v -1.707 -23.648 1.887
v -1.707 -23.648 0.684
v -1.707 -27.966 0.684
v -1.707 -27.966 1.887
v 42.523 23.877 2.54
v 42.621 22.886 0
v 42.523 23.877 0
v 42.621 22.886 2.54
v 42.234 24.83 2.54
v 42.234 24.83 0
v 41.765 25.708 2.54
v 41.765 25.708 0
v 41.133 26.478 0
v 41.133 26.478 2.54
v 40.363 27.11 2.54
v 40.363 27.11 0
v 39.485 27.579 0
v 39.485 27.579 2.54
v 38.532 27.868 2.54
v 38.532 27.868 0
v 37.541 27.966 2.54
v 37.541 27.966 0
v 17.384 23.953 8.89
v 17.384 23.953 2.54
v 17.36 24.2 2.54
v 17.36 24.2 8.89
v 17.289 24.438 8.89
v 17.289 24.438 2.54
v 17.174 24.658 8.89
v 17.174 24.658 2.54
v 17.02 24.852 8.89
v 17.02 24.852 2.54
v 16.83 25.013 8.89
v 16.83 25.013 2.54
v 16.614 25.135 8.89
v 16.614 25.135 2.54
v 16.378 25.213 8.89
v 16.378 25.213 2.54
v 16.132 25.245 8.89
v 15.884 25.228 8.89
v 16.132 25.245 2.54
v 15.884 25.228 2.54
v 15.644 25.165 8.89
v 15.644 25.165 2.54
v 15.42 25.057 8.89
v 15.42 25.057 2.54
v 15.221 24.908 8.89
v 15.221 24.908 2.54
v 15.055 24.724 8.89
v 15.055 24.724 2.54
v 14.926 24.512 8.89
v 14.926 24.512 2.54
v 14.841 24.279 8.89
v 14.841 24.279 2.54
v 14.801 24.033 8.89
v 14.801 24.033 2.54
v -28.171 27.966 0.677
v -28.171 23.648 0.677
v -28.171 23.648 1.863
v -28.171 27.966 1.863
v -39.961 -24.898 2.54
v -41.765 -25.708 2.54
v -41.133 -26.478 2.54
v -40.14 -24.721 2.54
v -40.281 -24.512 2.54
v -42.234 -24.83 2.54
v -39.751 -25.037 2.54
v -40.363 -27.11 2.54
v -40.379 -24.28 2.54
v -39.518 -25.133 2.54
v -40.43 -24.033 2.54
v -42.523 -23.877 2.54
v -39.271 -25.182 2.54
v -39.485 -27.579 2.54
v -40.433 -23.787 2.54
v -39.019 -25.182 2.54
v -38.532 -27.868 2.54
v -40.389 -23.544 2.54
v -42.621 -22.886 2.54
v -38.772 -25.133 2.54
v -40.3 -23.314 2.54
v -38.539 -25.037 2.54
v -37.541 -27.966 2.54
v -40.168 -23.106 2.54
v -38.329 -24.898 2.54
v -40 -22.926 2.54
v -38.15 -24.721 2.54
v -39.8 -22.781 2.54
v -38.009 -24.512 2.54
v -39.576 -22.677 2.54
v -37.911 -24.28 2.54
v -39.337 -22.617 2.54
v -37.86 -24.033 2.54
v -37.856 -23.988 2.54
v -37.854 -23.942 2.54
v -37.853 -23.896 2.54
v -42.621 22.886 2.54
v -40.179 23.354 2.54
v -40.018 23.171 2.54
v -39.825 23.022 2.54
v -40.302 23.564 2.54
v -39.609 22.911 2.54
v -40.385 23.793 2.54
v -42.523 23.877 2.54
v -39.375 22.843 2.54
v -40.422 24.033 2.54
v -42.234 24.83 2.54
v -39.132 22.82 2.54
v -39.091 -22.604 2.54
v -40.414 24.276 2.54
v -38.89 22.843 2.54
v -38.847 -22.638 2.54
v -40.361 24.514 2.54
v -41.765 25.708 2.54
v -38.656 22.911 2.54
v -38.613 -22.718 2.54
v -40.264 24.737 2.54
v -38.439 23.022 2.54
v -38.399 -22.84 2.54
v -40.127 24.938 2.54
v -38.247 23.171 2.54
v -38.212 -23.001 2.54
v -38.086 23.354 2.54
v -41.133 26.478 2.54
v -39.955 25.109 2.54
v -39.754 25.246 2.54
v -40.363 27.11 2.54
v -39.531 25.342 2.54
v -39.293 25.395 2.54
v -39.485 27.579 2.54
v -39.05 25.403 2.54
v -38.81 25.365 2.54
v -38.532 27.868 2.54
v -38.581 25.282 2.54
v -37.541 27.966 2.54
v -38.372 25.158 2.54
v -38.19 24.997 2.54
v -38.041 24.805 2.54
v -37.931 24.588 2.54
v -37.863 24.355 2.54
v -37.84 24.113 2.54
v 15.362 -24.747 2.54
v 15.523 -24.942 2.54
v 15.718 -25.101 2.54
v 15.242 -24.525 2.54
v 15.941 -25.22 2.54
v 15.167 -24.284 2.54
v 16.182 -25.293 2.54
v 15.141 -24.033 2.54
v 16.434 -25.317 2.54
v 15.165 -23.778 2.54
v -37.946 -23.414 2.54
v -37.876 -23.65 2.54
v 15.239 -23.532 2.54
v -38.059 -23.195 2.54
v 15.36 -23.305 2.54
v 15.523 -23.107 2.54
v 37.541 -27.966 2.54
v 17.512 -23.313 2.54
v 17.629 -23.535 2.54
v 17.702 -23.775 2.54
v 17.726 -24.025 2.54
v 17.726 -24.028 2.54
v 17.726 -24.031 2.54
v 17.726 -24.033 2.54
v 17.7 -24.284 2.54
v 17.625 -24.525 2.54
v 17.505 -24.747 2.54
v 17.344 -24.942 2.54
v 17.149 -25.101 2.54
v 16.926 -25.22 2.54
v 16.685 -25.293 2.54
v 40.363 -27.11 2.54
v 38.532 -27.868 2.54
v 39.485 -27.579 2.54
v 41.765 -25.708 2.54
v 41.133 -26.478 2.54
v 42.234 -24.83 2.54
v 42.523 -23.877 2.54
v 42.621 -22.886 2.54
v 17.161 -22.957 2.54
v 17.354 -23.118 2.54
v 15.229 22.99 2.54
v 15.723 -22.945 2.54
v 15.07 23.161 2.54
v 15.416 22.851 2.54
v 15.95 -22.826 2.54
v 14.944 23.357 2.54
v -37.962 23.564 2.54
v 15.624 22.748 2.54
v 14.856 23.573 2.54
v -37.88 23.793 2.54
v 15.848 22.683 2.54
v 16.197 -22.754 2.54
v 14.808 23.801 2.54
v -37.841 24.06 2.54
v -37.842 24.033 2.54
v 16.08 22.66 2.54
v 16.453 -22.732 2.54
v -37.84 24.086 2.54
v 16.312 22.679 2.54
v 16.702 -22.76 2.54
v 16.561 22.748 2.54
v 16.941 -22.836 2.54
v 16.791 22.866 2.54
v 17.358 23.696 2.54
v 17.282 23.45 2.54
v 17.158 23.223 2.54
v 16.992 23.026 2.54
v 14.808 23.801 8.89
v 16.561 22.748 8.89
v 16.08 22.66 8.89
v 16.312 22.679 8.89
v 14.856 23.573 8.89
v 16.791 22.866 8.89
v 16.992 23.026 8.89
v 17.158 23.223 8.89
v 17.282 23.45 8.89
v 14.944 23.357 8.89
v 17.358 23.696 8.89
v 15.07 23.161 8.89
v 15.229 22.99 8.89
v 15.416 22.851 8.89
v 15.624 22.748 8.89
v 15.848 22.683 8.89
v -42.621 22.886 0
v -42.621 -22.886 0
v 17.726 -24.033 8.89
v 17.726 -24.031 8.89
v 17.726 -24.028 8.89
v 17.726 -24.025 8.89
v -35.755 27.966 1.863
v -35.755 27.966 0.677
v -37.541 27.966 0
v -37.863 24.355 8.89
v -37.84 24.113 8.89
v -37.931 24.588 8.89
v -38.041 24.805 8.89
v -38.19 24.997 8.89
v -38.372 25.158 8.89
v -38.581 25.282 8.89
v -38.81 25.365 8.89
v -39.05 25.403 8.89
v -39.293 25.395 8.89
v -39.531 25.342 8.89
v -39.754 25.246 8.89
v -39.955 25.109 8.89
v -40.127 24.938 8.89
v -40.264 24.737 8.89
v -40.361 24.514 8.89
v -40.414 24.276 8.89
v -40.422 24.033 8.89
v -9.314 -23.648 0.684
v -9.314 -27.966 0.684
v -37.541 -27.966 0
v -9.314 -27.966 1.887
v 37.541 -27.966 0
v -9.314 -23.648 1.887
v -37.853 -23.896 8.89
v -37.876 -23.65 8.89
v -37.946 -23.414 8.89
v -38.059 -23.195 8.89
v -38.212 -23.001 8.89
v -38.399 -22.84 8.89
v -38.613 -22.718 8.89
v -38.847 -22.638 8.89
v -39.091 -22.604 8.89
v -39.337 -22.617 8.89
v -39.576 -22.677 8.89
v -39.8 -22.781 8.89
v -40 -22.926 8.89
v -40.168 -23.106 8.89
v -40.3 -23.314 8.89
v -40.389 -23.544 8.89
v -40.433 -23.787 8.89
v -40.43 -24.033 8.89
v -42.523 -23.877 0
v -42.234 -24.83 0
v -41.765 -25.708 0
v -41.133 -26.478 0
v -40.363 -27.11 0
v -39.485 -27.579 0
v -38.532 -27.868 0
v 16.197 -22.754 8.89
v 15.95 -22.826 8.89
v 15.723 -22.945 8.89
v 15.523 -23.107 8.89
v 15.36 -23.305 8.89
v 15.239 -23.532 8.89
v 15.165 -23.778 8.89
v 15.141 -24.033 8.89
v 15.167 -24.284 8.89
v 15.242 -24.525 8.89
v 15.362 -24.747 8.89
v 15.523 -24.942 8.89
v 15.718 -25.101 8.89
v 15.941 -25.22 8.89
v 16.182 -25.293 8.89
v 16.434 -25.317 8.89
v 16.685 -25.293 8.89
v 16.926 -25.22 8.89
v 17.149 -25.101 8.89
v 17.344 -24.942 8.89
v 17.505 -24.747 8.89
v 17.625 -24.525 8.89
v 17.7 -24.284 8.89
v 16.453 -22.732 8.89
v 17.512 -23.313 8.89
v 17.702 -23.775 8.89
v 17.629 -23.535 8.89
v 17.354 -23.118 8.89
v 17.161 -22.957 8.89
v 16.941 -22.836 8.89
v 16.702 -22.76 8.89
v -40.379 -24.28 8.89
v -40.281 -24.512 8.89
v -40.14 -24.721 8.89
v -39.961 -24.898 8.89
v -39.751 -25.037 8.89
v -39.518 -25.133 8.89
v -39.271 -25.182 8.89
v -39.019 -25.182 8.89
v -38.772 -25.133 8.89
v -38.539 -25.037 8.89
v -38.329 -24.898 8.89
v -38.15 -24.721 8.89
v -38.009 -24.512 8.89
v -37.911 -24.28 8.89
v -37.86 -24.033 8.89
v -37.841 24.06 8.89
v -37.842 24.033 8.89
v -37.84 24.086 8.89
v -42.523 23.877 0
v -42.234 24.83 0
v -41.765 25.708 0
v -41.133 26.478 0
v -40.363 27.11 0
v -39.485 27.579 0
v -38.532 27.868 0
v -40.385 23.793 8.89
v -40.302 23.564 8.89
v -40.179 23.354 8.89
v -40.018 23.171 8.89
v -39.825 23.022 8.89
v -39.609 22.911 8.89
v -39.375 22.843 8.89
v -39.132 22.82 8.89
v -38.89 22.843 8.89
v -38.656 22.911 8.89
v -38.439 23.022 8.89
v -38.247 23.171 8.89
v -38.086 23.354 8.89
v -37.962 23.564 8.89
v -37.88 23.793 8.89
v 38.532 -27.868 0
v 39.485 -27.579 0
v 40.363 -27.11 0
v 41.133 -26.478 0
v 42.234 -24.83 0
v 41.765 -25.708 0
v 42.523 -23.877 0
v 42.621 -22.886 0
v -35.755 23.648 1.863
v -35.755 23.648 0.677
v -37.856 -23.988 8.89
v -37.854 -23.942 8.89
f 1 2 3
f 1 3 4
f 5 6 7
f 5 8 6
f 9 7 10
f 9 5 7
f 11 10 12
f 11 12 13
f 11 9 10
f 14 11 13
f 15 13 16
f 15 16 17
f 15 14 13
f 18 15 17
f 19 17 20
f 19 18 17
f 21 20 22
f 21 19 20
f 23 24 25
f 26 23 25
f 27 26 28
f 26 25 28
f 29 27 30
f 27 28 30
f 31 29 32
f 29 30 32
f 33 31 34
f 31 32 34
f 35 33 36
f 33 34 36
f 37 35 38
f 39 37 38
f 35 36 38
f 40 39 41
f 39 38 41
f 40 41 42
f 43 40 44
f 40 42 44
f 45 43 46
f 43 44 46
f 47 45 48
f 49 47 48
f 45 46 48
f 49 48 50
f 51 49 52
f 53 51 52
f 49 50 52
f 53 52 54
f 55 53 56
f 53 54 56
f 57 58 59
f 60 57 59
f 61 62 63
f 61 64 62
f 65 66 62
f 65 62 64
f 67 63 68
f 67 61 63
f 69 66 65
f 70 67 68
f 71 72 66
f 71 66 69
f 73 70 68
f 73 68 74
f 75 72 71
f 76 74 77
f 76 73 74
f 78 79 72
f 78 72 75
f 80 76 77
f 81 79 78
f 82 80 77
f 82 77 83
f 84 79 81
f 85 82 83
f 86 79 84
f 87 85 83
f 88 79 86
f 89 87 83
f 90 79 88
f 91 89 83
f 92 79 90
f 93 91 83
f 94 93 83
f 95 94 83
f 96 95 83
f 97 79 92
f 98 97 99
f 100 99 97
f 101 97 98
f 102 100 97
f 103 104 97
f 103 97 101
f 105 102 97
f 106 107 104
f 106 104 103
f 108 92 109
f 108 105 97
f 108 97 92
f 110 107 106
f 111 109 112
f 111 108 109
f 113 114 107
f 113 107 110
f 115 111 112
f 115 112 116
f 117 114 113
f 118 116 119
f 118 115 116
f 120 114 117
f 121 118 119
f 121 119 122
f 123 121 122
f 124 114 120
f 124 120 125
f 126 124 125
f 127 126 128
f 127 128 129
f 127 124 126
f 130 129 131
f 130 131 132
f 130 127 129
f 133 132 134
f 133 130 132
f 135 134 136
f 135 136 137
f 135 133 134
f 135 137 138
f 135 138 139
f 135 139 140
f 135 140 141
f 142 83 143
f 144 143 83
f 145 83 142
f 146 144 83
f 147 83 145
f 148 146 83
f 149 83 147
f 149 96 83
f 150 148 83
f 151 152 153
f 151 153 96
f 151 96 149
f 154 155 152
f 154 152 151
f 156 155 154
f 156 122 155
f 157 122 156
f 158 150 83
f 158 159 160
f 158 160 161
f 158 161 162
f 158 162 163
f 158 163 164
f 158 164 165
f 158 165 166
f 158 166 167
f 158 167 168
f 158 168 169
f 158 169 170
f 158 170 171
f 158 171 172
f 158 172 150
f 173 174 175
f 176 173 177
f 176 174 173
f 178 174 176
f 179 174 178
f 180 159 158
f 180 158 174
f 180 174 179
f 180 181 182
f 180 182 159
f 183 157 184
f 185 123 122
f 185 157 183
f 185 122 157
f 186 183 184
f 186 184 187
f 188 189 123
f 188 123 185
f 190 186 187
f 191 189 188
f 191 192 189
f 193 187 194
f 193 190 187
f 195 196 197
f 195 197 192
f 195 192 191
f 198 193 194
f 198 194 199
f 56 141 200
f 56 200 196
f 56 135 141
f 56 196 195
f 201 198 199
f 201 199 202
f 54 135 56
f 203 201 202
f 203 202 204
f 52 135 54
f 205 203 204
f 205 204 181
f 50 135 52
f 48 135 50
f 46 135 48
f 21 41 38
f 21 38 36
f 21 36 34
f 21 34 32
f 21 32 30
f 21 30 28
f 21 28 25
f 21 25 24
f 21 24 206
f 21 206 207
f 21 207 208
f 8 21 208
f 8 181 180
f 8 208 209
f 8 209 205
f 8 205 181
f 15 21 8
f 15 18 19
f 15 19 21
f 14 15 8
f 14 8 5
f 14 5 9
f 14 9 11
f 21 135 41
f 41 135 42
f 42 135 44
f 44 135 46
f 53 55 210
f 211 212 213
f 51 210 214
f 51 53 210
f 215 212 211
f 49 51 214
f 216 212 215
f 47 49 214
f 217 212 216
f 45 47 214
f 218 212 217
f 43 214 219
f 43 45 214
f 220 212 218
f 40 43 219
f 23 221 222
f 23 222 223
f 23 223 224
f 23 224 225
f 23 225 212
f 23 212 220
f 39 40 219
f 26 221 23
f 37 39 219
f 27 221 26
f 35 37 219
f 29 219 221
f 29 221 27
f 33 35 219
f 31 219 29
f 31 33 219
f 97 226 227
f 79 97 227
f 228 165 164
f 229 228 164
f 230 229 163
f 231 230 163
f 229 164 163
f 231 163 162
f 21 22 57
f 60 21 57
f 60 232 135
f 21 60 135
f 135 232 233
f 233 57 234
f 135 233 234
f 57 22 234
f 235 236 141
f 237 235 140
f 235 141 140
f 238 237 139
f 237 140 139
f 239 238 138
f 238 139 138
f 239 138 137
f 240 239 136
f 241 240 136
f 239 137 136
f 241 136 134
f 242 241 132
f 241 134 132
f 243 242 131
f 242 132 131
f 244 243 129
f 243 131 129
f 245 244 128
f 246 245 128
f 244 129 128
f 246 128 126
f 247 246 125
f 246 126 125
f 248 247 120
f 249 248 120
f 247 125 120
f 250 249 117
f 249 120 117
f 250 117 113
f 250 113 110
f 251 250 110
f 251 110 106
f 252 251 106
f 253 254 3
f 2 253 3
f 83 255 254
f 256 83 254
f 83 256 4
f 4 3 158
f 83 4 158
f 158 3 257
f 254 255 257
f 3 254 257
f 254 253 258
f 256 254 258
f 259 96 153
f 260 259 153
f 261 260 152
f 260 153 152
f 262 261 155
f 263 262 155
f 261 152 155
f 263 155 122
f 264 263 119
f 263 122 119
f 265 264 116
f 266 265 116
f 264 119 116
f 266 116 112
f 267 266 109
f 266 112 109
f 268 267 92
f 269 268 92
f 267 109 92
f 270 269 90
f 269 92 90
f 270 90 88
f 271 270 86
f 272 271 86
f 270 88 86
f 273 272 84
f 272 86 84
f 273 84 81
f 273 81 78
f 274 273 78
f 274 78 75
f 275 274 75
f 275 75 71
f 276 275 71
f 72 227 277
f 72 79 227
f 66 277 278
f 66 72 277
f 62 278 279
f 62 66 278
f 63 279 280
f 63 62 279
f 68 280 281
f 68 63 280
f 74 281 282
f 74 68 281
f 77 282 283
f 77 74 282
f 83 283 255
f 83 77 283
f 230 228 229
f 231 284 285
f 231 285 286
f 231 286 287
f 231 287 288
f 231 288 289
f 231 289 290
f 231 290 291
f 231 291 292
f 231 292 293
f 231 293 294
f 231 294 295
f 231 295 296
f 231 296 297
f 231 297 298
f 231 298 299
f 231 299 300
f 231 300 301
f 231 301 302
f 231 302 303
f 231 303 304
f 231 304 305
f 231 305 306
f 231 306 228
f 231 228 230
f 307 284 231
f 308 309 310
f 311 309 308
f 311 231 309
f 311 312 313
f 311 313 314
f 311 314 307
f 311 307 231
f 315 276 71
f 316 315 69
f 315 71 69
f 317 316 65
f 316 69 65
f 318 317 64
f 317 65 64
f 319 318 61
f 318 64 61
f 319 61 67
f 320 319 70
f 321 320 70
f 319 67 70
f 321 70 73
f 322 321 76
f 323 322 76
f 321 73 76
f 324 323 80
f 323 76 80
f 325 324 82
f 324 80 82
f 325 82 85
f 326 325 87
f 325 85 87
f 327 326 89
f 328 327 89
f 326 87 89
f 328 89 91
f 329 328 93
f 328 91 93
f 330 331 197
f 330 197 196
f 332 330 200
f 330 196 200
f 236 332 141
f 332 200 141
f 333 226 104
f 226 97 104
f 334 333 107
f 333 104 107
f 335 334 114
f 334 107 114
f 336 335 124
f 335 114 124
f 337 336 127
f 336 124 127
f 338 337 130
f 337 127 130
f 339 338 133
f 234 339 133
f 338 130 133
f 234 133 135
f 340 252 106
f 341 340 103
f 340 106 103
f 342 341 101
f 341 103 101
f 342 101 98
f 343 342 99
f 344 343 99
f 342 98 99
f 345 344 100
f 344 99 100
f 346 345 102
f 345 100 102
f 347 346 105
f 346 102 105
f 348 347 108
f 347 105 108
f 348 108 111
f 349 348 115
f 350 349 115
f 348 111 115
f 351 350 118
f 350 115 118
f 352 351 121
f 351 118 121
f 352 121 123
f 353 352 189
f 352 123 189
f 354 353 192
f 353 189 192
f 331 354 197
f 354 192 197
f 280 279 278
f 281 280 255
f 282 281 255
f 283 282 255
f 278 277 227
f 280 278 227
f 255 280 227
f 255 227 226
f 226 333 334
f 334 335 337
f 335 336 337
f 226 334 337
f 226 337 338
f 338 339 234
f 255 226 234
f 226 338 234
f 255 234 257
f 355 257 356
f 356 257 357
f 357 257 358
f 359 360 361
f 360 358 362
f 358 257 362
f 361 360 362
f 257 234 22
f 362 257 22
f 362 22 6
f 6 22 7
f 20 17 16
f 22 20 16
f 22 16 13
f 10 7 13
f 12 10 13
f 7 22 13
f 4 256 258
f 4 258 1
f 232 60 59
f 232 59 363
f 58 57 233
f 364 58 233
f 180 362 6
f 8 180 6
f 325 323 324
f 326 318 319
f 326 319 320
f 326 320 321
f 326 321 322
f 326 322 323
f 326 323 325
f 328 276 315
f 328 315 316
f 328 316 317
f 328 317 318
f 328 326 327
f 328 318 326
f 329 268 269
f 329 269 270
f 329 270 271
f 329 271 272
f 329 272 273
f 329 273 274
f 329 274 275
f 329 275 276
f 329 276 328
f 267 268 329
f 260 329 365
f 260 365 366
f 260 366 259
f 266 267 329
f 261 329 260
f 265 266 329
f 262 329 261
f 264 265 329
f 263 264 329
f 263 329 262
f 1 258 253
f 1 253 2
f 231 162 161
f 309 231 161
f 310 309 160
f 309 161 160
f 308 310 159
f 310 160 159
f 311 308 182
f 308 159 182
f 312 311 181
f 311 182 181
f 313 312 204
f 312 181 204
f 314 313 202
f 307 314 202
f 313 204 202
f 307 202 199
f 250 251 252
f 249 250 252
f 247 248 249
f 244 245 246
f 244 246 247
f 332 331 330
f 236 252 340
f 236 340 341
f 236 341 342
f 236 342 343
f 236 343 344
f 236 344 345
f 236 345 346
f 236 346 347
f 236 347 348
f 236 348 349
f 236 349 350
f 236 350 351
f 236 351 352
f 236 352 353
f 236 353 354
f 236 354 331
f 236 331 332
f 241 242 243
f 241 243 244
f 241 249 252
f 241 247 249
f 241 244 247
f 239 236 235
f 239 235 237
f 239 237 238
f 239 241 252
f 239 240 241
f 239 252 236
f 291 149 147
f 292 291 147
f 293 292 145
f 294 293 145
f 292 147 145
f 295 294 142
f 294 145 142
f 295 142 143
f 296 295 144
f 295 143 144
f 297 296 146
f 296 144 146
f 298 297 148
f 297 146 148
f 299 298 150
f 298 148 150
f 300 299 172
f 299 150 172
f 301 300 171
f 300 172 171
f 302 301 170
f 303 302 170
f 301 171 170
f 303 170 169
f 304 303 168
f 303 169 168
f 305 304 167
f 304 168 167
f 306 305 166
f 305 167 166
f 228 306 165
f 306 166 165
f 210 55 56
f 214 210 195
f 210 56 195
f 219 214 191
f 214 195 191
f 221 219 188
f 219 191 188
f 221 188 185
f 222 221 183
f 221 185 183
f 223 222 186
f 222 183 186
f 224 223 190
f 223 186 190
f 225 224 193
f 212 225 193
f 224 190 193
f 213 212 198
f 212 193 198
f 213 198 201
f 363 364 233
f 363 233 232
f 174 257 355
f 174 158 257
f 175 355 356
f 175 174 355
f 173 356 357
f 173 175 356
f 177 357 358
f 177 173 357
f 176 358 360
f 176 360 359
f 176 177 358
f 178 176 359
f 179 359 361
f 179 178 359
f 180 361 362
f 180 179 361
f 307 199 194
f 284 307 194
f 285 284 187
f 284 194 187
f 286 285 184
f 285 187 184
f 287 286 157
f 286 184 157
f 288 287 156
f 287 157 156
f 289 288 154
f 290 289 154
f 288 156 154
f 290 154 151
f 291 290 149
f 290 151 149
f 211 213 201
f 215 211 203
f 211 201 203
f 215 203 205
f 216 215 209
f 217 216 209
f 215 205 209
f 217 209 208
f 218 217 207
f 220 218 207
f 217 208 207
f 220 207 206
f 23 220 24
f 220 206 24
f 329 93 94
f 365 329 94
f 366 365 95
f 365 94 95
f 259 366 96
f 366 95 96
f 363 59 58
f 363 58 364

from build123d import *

# Parameters (mm, degrees)
F1_DEPTH = 2.54
F2_R     = 5.08
F3_DEPTH = 8.89
F5_W     = 7.6071470976
F5_H     = 1.2031628285
F6_DEPTH = 4.318
F7_W     = 7.584489882
F7_H     = 1.1869876339
F8_DEPTH = 4.318


# Not quite as in the source:
# - ends of sketch curves that miss each other by under 0.0002 mm in the source are joined


with BuildPart() as f1:
    # F0 (on Top) → F1 (new body)
    with BuildSketch(Plane.XY):
        with BuildLine():
            Line((-42.6210959934, 27.9657971114), (-42.6210959934, 24.0334319246))
            Line((-42.6210959934, 24.0334319246), (-40.4223592815, 24.0334319246))
            ThreePointArc((-40.4223592815, 24.0334319246), (-39.1720464715, 25.4046969243), (-37.8398531152, 24.1128336638))
            ThreePointArc((-37.8398531152, 24.1128336638), (-37.8404635808, 24.0731140337), (-37.8422944012, 24.0334319246))
            Line((-37.8422944012, 24.0334319246), (14.8014883525, 24.0334319246))
            ThreePointArc((14.8014883525, 24.0334319246), (16.1318254594, 25.2445390274), (17.3839117365, 23.9526964724))
            ThreePointArc((17.3839117365, 23.9526964724), (17.080387221, 23.1205499759), (16.312373062, 22.6792460274))
            Line((16.312373062, 22.6792460274), (16.4525141181, -22.7324364705))
            ThreePointArc((16.4525141181, -22.7324364705), (17.3541679288, -23.1175729008), (17.726055436, -24.0247715265))
            ThreePointArc((17.726055436, -24.0247715265), (17.7260481822, -24.0291017499), (17.7260264206, -24.0334319246))
            Line((17.7260264206, -24.0334319246), (42.6210959934, -24.0334319246))
            Line((42.6210959934, -24.0334319246), (42.6210959934, 24.0334319246))
            Line((42.6210959934, 24.0334319246), (42.6210959934, 27.965891646))
            Line((42.6210959934, 27.965891646), (-42.6210959934, 27.9657971114))
        make_face()
        with BuildLine():
            Line((-42.6210959934, 24.0334319246), (-42.6210959934, -24.0334319246))
            Line((-42.6210959934, -24.0334319246), (-40.4303500829, -24.0334319246))
            ThreePointArc((-40.4303500829, -24.0334319246), (-39.2142367954, -22.6050090303), (-37.8527686966, -23.8956399262))
            ThreePointArc((-37.8527686966, -23.8956399262), (-37.8546115269, -23.9646342987), (-37.8601347627, -24.0334319246))
            Line((-37.8601347627, -24.0334319246), (15.1411369991, -24.0334319246))
            ThreePointArc((15.1411369991, -24.0334319246), (15.5233039011, -23.1072298959), (16.4525141181, -22.7324364705))
            Line((16.4525141181, -22.7324364705), (16.312373062, 22.6792460274))
            ThreePointArc((16.312373062, 22.6792460274), (15.2287950262, 22.9902332706), (14.8014883525, 24.0334319246))
            Line((14.8014883525, 24.0334319246), (-37.8422944012, 24.0334319246))
            ThreePointArc((-37.8422944012, 24.0334319246), (-39.1323268414, 22.8203599376), (-40.4223592815, 24.0334319246))
            Line((-40.4223592815, 24.0334319246), (-42.6210959934, 24.0334319246))
        make_face()
        with BuildLine():
            Line((-40.4303500829, -24.0334319246), (-42.6210959934, -24.0334319246))
            Line((-42.6210959934, -24.0334319246), (-42.6210959934, -27.965891646))
            Line((-42.6210959934, -27.965891646), (42.6210959934, -27.965891646))
            Line((42.6210959934, -27.965891646), (42.6210959934, -24.0334319246))
            Line((42.6210959934, -24.0334319246), (17.7260264206, -24.0334319246))
            ThreePointArc((17.7260264206, -24.0334319246), (16.4335817099, -25.3172452526), (15.1411369991, -24.0334319246))
            Line((15.1411369991, -24.0334319246), (-37.8601347627, -24.0334319246))
            ThreePointArc((-37.8601347627, -24.0334319246), (-39.1452424228, -25.1881136524), (-40.4303500829, -24.0334319246))
        make_face()
    extrude(amount=F1_DEPTH)

    # F2
    f2_edges = [f1.edges().sort_by_distance(p)[0] for p in [
        (42.621096, -27.965892, 1.27),
        (-42.621096, -27.965892, 1.27),
        (42.621096, 27.965892, 1.27),
        (-42.621096, 27.965797, 1.27),
    ]]
    fillet(f2_edges, radius=F2_R)

    # F0 (on Top) → F3 (join)
    with BuildSketch(Plane.XY):
        with BuildLine():
            ThreePointArc((-37.8398531152, 24.1128336638), (-39.1720464715, 25.4046969243), (-40.4223592815, 24.0334319246))
            Line((-40.4223592815, 24.0334319246), (-37.8422944012, 24.0334319246))
            ThreePointArc((-37.8422944012, 24.0334319246), (-37.8404635808, 24.0731140337), (-37.8398531152, 24.1128336638))
        make_face()
        with BuildLine():
            Line((-37.8422944012, 24.0334319246), (-40.4223592815, 24.0334319246))
            ThreePointArc((-40.4223592815, 24.0334319246), (-39.1323268414, 22.8203599376), (-37.8422944012, 24.0334319246))
        make_face()
        with BuildLine():
            ThreePointArc((-37.8527686966, -23.8956399262), (-39.2142367954, -22.6050090303), (-40.4303500829, -24.0334319246))
            Line((-40.4303500829, -24.0334319246), (-37.8601347627, -24.0334319246))
            ThreePointArc((-37.8601347627, -24.0334319246), (-37.8546115269, -23.9646342987), (-37.8527686966, -23.8956399262))
        make_face()
        with BuildLine():
            Line((-37.8601347627, -24.0334319246), (-40.4303500829, -24.0334319246))
            ThreePointArc((-40.4303500829, -24.0334319246), (-39.1452424228, -25.1881136524), (-37.8601347627, -24.0334319246))
        make_face()
        with BuildLine():
            ThreePointArc((17.3839117365, 23.9526964724), (16.1318254594, 25.2445390274), (14.8014883525, 24.0334319246))
            Line((14.8014883525, 24.0334319246), (16.3081940264, 24.0334319246))
            Line((16.3081940264, 24.0334319246), (16.312373062, 22.6792460274))
            ThreePointArc((16.312373062, 22.6792460274), (17.080387221, 23.1205499759), (17.3839117365, 23.9526964724))
        make_face()
        with BuildLine():
            Line((16.3081940264, 24.0334319246), (14.8014883525, 24.0334319246))
            ThreePointArc((14.8014883525, 24.0334319246), (15.2287950262, 22.9902332706), (16.312373062, 22.6792460274))
            Line((16.312373062, 22.6792460274), (16.3081940264, 24.0334319246))
        make_face()
        with BuildLine():
            Line((16.4525141181, -22.7324364705), (16.4565290074, -24.0334319246))
            Line((16.4565290074, -24.0334319246), (17.7260264206, -24.0334319246))
            ThreePointArc((17.7260264206, -24.0334319246), (17.7260481822, -24.0291017499), (17.726055436, -24.0247715265))
            ThreePointArc((17.726055436, -24.0247715265), (17.3541679288, -23.1175729008), (16.4525141181, -22.7324364705))
        make_face()
        with BuildLine():
            ThreePointArc((16.4525141181, -22.7324364705), (15.5233039011, -23.1072298959), (15.1411369991, -24.0334319246))
            Line((15.1411369991, -24.0334319246), (16.4565290074, -24.0334319246))
            Line((16.4565290074, -24.0334319246), (16.4525141181, -22.7324364705))
        make_face()
        with BuildLine():
            Line((16.4565290074, -24.0334319246), (15.1411369991, -24.0334319246))
            ThreePointArc((15.1411369991, -24.0334319246), (16.4335817099, -25.3172452526), (17.7260264206, -24.0334319246))
            Line((17.7260264206, -24.0334319246), (16.4565290074, -24.0334319246))
        make_face()
    extrude(amount=F3_DEPTH)

    # F5 (on face) → F6 (cut)
    with BuildSketch(Plane.XZ.offset(27.965891646)):
        with Locations((-5.5109024979, 1.2853431981)):
            Rectangle(F5_W, F5_H)
    extrude(amount=-F6_DEPTH, mode=Mode.SUBTRACT)

    # F7 (on face) → F8 (cut)
    with BuildSketch(Plane(origin=(0, 27.965891646, 0), x_dir=(-1, 0, 0), z_dir=(0, 1, 0))):
        with Locations((31.9627784193, 1.27)):
            Rectangle(F7_W, F7_H)
    extrude(amount=-F8_DEPTH, mode=Mode.SUBTRACT)


solid = f1.part
